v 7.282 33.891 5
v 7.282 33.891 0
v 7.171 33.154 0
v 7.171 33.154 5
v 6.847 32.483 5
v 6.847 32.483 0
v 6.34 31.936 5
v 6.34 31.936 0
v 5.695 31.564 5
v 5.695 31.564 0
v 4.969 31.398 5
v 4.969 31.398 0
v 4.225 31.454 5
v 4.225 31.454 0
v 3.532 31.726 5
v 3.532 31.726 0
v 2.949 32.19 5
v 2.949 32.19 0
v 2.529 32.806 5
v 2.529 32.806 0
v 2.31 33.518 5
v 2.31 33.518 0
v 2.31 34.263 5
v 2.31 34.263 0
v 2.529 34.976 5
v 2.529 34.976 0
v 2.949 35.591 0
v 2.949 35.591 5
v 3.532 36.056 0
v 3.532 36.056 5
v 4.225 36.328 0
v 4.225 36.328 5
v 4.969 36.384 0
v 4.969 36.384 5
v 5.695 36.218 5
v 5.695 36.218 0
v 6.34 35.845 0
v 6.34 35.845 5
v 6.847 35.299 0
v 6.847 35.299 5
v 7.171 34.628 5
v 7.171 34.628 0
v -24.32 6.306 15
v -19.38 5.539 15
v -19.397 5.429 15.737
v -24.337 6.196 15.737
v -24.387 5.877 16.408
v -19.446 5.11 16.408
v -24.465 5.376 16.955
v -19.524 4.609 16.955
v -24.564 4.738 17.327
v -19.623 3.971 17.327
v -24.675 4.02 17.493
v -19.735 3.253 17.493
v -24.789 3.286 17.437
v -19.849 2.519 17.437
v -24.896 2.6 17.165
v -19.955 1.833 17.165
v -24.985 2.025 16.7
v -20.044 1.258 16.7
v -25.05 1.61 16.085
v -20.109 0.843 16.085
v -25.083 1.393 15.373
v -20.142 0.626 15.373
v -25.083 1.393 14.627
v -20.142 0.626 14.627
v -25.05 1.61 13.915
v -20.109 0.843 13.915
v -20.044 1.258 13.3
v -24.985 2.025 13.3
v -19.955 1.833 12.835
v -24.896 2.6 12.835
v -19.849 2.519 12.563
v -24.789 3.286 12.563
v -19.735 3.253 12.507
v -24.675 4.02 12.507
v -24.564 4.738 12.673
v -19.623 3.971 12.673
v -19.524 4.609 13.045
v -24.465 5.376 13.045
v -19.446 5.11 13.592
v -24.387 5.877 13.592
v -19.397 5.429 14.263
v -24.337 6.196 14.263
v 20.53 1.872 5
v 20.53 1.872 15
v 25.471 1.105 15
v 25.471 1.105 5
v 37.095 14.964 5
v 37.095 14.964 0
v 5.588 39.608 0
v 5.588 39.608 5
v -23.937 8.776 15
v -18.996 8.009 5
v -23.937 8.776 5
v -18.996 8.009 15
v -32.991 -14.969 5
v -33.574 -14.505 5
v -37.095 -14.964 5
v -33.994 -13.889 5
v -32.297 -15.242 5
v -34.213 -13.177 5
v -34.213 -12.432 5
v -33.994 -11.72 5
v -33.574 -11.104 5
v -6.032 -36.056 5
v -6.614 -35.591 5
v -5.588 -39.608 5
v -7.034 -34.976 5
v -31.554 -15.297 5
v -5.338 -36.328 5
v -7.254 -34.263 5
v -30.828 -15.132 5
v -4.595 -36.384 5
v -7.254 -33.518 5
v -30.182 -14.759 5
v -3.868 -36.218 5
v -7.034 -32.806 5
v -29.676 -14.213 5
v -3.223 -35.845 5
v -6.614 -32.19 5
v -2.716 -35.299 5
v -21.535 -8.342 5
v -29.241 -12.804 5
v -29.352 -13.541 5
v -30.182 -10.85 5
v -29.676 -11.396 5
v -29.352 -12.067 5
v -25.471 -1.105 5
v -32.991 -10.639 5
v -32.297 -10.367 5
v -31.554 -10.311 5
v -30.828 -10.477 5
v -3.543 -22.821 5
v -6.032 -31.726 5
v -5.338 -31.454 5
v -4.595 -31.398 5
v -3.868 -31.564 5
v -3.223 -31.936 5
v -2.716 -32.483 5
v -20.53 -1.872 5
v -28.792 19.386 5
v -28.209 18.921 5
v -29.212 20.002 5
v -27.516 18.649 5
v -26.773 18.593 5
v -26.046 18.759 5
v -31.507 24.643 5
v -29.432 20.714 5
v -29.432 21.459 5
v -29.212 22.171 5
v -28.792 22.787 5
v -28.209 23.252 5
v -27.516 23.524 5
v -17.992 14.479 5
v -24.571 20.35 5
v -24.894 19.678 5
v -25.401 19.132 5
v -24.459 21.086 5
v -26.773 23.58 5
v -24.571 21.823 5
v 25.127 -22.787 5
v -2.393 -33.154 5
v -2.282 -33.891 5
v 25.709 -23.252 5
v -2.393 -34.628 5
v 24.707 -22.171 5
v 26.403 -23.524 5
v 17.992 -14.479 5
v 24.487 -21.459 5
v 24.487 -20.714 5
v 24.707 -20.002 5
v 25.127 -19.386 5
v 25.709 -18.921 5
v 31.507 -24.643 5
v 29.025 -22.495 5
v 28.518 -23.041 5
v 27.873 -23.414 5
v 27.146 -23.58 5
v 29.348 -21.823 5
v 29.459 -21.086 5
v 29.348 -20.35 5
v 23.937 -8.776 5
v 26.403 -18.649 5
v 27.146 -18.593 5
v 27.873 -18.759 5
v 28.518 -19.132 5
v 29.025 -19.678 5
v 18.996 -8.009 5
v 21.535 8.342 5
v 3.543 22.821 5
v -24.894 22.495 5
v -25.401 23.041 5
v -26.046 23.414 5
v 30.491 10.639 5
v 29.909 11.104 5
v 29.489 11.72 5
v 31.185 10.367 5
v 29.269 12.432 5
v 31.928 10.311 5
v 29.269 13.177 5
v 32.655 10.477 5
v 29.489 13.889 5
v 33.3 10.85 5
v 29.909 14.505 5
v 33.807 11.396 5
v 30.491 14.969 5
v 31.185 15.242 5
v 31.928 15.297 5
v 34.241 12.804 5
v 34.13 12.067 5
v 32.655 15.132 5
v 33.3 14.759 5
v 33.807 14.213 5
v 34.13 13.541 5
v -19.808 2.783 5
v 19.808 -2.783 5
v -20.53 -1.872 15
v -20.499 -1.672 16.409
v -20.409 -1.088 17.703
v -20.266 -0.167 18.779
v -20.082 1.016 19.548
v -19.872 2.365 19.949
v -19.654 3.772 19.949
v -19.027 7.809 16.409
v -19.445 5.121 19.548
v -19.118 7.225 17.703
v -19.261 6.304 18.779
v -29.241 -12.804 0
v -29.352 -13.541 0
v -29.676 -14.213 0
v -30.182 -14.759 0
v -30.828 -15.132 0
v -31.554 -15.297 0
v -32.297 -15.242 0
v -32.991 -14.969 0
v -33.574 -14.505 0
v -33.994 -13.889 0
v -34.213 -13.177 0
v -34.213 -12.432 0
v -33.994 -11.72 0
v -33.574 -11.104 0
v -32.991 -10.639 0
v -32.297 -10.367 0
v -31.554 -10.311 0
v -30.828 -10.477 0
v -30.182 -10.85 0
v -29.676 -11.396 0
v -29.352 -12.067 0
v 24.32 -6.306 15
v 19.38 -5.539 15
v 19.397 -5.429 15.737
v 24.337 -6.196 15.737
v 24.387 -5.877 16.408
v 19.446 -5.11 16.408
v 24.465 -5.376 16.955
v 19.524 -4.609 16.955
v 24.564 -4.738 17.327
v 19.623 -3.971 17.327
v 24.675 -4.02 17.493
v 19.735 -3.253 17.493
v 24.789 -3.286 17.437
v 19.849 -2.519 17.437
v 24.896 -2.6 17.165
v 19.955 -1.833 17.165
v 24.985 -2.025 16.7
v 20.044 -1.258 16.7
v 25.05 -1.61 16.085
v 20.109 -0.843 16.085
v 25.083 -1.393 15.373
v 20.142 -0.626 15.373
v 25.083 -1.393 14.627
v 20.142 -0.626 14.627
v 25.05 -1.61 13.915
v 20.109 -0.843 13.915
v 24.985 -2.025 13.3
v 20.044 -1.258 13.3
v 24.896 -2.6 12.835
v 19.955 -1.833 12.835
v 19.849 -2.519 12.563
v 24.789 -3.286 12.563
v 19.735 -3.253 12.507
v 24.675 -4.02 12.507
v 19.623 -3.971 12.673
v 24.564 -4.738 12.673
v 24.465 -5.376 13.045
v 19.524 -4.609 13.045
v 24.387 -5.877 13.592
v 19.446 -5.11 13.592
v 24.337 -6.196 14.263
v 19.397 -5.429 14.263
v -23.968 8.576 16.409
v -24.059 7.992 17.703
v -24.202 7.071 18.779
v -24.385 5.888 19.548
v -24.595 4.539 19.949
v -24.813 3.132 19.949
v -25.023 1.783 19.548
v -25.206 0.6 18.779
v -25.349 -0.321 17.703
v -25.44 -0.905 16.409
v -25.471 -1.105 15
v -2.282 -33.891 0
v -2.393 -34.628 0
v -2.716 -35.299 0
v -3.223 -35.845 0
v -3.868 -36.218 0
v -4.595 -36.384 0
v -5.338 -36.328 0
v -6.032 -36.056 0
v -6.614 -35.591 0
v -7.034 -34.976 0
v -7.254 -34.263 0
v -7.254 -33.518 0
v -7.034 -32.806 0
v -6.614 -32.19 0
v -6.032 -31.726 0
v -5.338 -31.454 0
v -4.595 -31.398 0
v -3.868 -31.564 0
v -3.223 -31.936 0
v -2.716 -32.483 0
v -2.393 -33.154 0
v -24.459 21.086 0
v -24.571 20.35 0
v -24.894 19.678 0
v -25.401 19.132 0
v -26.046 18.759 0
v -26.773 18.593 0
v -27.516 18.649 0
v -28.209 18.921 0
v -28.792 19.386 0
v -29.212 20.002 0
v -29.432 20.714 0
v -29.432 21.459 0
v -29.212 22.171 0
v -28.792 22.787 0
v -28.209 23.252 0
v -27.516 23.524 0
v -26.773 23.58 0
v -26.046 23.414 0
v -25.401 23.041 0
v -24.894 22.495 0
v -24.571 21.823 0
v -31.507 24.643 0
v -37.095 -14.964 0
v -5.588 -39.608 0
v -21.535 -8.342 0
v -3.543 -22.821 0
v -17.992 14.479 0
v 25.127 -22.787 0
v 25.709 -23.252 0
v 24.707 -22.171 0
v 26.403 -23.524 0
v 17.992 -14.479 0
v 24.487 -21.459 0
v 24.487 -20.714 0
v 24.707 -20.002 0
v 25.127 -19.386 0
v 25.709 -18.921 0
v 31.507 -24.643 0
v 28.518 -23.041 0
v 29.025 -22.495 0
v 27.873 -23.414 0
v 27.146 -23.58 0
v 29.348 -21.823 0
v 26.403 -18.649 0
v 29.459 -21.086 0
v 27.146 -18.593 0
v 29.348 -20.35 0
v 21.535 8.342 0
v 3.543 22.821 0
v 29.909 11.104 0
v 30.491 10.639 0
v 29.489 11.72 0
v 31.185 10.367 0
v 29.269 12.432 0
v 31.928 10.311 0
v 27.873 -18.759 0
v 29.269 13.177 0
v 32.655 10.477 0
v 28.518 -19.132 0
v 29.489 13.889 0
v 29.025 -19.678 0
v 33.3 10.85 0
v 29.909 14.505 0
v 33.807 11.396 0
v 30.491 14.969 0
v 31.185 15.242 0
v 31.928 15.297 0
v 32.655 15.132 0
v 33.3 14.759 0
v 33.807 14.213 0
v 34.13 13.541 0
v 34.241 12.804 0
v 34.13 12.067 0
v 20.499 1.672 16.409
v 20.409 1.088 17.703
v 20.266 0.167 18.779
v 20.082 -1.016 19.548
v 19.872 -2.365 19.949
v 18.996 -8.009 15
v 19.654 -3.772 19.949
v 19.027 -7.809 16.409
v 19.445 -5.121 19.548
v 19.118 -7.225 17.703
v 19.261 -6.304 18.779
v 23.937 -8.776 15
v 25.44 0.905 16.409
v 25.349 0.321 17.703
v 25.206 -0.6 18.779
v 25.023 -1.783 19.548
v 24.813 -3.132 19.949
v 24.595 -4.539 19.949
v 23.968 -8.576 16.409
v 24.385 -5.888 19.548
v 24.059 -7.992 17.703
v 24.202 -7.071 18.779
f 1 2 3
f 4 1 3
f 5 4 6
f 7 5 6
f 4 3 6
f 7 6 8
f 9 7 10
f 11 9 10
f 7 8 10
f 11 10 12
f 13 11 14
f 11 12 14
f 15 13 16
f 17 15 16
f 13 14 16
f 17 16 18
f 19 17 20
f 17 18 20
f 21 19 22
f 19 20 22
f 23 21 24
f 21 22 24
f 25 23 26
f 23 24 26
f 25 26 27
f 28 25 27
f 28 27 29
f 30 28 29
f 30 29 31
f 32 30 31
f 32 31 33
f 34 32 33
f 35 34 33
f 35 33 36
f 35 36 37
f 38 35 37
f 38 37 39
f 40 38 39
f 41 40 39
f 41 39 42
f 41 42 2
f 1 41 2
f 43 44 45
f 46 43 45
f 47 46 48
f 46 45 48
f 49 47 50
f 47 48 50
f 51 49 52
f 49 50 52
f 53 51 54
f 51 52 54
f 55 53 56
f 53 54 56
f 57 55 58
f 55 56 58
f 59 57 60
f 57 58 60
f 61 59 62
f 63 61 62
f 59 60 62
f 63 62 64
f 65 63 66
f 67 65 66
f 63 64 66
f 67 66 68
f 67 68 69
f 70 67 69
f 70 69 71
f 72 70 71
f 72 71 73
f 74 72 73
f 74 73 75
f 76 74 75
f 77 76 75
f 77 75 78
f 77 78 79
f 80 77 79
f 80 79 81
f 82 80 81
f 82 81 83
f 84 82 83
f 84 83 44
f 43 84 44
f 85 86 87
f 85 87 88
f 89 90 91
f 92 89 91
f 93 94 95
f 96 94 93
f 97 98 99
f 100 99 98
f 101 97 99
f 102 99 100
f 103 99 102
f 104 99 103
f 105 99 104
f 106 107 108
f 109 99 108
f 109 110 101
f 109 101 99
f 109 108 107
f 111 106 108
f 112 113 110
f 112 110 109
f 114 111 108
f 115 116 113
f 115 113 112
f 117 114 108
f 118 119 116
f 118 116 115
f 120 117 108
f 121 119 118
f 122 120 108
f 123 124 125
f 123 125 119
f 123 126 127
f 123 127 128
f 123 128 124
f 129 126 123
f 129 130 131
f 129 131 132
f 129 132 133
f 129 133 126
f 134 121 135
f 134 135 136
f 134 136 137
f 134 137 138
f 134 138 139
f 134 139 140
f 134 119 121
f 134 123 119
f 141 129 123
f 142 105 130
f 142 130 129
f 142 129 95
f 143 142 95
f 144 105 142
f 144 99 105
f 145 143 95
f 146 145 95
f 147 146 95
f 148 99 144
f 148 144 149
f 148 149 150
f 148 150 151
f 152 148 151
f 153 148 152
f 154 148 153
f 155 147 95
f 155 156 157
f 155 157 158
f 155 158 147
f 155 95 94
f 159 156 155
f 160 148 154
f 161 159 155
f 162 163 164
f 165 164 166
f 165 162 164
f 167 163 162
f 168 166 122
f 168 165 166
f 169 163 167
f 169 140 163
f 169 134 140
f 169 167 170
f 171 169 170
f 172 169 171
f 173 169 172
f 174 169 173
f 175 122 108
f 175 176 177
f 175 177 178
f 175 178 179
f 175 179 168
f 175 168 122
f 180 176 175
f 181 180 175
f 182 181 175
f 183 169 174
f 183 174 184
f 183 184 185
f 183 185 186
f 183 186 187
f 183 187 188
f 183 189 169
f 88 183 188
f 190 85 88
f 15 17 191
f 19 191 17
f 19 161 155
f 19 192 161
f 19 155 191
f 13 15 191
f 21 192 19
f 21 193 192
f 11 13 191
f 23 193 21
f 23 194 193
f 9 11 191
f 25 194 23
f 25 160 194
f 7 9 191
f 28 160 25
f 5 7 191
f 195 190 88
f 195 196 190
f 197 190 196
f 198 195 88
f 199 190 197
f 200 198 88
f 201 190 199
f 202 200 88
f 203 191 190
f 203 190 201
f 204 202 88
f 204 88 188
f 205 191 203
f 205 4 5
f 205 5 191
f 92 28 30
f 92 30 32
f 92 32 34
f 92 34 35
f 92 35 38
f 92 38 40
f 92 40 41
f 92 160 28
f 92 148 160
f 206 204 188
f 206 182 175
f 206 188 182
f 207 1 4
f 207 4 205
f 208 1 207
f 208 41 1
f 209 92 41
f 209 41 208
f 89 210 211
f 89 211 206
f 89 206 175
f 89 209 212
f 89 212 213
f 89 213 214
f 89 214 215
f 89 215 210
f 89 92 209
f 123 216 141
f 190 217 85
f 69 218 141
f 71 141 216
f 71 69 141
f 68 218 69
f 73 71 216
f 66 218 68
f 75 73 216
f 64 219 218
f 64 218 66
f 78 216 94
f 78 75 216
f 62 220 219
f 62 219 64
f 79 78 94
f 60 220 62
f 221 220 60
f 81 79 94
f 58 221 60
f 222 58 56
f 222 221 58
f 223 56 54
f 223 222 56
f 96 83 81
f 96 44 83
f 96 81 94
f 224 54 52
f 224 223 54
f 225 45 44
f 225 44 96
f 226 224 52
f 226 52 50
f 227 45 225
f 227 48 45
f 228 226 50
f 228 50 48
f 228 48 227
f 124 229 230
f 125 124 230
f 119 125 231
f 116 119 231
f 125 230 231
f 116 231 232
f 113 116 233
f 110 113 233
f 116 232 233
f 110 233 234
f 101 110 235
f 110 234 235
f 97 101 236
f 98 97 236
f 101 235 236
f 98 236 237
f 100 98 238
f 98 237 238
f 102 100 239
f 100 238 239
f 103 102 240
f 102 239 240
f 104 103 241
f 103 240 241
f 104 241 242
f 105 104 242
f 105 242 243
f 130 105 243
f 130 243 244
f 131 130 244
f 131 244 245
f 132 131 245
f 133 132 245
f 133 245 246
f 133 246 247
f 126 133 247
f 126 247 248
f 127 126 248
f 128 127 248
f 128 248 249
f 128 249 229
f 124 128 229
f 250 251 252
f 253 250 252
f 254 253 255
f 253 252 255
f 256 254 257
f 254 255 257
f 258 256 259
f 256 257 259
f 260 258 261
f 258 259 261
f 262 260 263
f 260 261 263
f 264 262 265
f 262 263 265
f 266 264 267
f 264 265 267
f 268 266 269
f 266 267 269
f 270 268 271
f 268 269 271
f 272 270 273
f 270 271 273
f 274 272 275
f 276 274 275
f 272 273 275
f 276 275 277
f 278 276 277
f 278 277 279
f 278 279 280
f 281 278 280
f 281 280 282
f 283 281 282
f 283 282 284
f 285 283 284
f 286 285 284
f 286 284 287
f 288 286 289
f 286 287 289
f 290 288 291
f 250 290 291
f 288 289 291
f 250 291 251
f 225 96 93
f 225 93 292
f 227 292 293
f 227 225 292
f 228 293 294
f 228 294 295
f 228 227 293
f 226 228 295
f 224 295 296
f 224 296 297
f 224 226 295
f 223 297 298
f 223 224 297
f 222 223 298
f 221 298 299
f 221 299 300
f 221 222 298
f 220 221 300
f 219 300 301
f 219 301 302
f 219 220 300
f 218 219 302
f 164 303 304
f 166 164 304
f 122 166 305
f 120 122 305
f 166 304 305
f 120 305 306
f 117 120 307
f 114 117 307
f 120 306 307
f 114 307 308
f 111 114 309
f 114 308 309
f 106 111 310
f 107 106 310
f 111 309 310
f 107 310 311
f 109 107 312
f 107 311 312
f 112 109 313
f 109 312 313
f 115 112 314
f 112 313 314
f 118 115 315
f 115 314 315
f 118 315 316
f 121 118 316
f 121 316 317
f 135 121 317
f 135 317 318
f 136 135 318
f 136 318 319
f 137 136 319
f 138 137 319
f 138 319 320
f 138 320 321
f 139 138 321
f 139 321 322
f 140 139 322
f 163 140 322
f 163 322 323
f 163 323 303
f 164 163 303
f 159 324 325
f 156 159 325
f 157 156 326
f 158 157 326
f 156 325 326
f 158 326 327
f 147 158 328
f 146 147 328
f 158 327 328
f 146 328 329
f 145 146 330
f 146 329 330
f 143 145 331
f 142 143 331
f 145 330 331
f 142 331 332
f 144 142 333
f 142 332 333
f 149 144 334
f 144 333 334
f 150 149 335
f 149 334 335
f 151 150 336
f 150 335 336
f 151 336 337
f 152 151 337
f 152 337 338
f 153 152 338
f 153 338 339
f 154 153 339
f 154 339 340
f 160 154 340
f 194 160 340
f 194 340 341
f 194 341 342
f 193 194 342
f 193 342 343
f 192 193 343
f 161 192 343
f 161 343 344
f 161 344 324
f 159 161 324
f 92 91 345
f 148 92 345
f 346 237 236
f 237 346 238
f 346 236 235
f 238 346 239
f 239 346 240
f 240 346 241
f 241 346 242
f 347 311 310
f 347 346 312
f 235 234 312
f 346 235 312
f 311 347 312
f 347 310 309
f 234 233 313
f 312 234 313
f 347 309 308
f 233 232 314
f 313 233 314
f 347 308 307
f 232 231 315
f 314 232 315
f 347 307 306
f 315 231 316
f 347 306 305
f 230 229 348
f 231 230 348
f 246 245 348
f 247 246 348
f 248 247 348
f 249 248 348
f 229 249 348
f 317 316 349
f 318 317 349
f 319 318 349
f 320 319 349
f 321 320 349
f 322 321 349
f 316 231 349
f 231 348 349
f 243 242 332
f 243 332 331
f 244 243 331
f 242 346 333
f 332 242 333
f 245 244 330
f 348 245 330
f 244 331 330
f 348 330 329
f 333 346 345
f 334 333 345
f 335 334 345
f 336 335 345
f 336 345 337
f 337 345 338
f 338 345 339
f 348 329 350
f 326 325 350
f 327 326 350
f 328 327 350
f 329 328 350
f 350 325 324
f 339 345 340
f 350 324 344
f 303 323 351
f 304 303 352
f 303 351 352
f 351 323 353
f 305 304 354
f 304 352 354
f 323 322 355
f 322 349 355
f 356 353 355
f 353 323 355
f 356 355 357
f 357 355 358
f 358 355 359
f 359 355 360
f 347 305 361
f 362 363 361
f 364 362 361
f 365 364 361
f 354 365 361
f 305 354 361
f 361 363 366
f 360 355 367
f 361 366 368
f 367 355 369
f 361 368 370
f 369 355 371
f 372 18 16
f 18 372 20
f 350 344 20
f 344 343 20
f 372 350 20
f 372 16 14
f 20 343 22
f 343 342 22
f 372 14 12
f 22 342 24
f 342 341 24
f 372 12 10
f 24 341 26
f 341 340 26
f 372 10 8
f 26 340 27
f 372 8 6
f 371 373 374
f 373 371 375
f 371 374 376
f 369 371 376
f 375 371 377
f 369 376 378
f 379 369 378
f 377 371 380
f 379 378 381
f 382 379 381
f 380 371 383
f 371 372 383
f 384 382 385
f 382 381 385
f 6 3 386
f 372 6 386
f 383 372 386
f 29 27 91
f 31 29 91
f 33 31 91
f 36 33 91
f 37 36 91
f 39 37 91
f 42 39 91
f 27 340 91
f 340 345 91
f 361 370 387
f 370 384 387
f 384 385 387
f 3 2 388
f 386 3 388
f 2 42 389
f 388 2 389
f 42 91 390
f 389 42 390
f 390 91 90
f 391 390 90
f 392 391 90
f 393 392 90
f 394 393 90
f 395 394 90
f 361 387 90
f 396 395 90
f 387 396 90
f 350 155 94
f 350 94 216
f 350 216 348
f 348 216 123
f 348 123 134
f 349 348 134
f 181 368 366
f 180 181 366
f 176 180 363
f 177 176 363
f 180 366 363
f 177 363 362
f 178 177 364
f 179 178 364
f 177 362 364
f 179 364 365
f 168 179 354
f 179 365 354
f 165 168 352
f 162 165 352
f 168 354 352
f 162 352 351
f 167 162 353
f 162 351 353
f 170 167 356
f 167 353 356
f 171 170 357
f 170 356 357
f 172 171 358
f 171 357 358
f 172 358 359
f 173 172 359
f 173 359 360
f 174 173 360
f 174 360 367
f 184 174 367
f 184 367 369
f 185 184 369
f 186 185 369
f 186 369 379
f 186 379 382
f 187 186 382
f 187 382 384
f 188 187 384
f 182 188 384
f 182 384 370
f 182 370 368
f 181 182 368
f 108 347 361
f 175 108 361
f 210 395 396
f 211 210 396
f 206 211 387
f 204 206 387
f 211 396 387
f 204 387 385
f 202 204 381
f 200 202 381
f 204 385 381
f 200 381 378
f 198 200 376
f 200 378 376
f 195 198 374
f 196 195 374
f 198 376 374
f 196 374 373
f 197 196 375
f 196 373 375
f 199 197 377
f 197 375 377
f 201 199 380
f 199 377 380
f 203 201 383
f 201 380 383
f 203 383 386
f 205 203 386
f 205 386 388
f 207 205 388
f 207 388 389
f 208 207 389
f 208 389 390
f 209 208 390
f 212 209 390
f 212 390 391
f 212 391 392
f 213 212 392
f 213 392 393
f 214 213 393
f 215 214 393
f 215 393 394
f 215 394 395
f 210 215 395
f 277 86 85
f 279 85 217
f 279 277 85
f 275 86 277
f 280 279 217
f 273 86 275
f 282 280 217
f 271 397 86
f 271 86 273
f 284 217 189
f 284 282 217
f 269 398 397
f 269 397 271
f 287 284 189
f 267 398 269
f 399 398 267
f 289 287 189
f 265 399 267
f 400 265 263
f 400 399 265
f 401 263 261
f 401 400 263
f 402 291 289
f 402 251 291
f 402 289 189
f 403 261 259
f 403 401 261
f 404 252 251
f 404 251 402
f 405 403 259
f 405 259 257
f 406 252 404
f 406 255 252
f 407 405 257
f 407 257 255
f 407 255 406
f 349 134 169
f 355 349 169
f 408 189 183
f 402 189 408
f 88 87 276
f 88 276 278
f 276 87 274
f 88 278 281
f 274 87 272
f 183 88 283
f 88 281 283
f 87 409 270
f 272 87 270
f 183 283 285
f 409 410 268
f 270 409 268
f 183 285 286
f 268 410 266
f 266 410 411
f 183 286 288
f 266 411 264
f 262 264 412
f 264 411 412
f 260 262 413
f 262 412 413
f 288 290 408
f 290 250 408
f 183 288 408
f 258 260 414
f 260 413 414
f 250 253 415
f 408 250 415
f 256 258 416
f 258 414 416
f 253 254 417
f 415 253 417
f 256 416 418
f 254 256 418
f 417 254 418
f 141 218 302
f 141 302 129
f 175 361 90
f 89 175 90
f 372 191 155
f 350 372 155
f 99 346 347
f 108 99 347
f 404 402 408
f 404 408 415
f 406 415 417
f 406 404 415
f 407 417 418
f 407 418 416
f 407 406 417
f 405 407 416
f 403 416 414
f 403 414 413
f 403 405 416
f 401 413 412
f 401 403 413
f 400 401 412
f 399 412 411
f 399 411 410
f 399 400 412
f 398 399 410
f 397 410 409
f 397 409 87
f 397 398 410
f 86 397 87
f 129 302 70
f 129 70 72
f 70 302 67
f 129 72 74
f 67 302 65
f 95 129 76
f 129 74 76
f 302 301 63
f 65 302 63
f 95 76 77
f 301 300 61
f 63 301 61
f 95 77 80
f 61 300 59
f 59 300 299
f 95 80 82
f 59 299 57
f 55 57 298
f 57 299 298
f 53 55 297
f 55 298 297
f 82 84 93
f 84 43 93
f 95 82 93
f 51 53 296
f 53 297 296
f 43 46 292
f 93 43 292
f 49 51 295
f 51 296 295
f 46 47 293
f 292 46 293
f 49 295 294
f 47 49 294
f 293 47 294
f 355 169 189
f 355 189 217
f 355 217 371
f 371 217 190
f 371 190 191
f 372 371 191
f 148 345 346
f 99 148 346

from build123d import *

# Parameters (mm, degrees)
F1_DEPTH  = 5
F2_R      = 2.5
F3_DEPTH  = 25
F5_DEPTH  = 6
F7_DEPTH  = 5
F8_R      = 2.5
F9_DEPTH  = 25
F10_R     = 2.5
F11_DEPTH = 5


with BuildPart() as f1:
    # F0 (on Top) → F1 (new body)
    with BuildSketch(Plane.XY):
        Polygon((31.50713, -24.643473), (37.095438, 14.964239), (5.588308, 39.607712), (-31.50713, 24.643473), (-37.095438, -14.964239), (-5.588308, -39.607712), align=None)
    extrude(amount=F1_DEPTH)

    # F2 (on face) → F3 (cut)
    with BuildSketch(Plane(origin=(0, 0, 0), x_dir=(1, 0, 0), z_dir=(0, 0, -1))):
        with Locations((31.741173, -12.804337)):
            Circle(F2_R)
        with Locations((4.781705, -33.890831)):
            Circle(F2_R)
        with Locations((-26.959468, -21.086494)):
            Circle(F2_R)
        with Locations((-31.741173, 12.804337)):
            Circle(F2_R)
        with Locations((-4.781705, 33.890831)):
            Circle(F2_R)
        with Locations((26.959468, 21.086494)):
            Circle(F2_R)
    extrude(amount=-F3_DEPTH, mode=Mode.SUBTRACT)

    # F4 (on face) → F5 (cut)
    with BuildSketch(Plane.XY.offset(5)):
        Polygon((17.991608, -14.47879), (21.534804, 8.341794), (3.543196, 22.820585), (-17.991608, 14.47879), (-21.534804, -8.341794), (-3.543196, -22.820585), align=None)
    extrude(amount=-F5_DEPTH, mode=Mode.SUBTRACT)

    # F6 (on face) → F7 (join)
    with BuildSketch(Plane(origin=(-19.763206, 3.068498, 0), x_dir=(0.153425, 0.98816, 0), z_dir=(0.98816, -0.153425, 0))):
        with BuildLine():
            Line((-5, 15), (-5, 5))
            Line((-5, 5), (5, 5))
            Line((5, 5), (5, 15))
            ThreePointArc((5, 15), (0, 20), (-5, 15))
        make_face()
    extrude(amount=-F7_DEPTH)

    # F8 (on face) → F9 (cut)
    with BuildSketch(Plane(origin=(-19.763206, 3.068498, 0), x_dir=(0.153425, 0.98816, 0), z_dir=(0.98816, -0.153425, 0))):
        with Locations((0, 15)):
            Circle(F8_R)
    extrude(amount=-F9_DEPTH, mode=Mode.SUBTRACT)

    # F10 (on face) → F11 (join)
    with BuildSketch(Plane(origin=(19.763206, -3.068498, 0), x_dir=(-0.153425, -0.98816, 0), z_dir=(-0.98816, 0.153425, 0))):
        with BuildLine():
            Line((-5, 15), (-5, 5))
            Line((-5, 5), (5, 5))
            Line((5, 5), (5, 15))
            ThreePointArc((5, 15), (0, 20), (-5, 15))
        make_face()
        with Locations((0, 15)):
            Circle(F10_R, mode=Mode.SUBTRACT)
    extrude(amount=-F11_DEPTH)


solid = f1.part
